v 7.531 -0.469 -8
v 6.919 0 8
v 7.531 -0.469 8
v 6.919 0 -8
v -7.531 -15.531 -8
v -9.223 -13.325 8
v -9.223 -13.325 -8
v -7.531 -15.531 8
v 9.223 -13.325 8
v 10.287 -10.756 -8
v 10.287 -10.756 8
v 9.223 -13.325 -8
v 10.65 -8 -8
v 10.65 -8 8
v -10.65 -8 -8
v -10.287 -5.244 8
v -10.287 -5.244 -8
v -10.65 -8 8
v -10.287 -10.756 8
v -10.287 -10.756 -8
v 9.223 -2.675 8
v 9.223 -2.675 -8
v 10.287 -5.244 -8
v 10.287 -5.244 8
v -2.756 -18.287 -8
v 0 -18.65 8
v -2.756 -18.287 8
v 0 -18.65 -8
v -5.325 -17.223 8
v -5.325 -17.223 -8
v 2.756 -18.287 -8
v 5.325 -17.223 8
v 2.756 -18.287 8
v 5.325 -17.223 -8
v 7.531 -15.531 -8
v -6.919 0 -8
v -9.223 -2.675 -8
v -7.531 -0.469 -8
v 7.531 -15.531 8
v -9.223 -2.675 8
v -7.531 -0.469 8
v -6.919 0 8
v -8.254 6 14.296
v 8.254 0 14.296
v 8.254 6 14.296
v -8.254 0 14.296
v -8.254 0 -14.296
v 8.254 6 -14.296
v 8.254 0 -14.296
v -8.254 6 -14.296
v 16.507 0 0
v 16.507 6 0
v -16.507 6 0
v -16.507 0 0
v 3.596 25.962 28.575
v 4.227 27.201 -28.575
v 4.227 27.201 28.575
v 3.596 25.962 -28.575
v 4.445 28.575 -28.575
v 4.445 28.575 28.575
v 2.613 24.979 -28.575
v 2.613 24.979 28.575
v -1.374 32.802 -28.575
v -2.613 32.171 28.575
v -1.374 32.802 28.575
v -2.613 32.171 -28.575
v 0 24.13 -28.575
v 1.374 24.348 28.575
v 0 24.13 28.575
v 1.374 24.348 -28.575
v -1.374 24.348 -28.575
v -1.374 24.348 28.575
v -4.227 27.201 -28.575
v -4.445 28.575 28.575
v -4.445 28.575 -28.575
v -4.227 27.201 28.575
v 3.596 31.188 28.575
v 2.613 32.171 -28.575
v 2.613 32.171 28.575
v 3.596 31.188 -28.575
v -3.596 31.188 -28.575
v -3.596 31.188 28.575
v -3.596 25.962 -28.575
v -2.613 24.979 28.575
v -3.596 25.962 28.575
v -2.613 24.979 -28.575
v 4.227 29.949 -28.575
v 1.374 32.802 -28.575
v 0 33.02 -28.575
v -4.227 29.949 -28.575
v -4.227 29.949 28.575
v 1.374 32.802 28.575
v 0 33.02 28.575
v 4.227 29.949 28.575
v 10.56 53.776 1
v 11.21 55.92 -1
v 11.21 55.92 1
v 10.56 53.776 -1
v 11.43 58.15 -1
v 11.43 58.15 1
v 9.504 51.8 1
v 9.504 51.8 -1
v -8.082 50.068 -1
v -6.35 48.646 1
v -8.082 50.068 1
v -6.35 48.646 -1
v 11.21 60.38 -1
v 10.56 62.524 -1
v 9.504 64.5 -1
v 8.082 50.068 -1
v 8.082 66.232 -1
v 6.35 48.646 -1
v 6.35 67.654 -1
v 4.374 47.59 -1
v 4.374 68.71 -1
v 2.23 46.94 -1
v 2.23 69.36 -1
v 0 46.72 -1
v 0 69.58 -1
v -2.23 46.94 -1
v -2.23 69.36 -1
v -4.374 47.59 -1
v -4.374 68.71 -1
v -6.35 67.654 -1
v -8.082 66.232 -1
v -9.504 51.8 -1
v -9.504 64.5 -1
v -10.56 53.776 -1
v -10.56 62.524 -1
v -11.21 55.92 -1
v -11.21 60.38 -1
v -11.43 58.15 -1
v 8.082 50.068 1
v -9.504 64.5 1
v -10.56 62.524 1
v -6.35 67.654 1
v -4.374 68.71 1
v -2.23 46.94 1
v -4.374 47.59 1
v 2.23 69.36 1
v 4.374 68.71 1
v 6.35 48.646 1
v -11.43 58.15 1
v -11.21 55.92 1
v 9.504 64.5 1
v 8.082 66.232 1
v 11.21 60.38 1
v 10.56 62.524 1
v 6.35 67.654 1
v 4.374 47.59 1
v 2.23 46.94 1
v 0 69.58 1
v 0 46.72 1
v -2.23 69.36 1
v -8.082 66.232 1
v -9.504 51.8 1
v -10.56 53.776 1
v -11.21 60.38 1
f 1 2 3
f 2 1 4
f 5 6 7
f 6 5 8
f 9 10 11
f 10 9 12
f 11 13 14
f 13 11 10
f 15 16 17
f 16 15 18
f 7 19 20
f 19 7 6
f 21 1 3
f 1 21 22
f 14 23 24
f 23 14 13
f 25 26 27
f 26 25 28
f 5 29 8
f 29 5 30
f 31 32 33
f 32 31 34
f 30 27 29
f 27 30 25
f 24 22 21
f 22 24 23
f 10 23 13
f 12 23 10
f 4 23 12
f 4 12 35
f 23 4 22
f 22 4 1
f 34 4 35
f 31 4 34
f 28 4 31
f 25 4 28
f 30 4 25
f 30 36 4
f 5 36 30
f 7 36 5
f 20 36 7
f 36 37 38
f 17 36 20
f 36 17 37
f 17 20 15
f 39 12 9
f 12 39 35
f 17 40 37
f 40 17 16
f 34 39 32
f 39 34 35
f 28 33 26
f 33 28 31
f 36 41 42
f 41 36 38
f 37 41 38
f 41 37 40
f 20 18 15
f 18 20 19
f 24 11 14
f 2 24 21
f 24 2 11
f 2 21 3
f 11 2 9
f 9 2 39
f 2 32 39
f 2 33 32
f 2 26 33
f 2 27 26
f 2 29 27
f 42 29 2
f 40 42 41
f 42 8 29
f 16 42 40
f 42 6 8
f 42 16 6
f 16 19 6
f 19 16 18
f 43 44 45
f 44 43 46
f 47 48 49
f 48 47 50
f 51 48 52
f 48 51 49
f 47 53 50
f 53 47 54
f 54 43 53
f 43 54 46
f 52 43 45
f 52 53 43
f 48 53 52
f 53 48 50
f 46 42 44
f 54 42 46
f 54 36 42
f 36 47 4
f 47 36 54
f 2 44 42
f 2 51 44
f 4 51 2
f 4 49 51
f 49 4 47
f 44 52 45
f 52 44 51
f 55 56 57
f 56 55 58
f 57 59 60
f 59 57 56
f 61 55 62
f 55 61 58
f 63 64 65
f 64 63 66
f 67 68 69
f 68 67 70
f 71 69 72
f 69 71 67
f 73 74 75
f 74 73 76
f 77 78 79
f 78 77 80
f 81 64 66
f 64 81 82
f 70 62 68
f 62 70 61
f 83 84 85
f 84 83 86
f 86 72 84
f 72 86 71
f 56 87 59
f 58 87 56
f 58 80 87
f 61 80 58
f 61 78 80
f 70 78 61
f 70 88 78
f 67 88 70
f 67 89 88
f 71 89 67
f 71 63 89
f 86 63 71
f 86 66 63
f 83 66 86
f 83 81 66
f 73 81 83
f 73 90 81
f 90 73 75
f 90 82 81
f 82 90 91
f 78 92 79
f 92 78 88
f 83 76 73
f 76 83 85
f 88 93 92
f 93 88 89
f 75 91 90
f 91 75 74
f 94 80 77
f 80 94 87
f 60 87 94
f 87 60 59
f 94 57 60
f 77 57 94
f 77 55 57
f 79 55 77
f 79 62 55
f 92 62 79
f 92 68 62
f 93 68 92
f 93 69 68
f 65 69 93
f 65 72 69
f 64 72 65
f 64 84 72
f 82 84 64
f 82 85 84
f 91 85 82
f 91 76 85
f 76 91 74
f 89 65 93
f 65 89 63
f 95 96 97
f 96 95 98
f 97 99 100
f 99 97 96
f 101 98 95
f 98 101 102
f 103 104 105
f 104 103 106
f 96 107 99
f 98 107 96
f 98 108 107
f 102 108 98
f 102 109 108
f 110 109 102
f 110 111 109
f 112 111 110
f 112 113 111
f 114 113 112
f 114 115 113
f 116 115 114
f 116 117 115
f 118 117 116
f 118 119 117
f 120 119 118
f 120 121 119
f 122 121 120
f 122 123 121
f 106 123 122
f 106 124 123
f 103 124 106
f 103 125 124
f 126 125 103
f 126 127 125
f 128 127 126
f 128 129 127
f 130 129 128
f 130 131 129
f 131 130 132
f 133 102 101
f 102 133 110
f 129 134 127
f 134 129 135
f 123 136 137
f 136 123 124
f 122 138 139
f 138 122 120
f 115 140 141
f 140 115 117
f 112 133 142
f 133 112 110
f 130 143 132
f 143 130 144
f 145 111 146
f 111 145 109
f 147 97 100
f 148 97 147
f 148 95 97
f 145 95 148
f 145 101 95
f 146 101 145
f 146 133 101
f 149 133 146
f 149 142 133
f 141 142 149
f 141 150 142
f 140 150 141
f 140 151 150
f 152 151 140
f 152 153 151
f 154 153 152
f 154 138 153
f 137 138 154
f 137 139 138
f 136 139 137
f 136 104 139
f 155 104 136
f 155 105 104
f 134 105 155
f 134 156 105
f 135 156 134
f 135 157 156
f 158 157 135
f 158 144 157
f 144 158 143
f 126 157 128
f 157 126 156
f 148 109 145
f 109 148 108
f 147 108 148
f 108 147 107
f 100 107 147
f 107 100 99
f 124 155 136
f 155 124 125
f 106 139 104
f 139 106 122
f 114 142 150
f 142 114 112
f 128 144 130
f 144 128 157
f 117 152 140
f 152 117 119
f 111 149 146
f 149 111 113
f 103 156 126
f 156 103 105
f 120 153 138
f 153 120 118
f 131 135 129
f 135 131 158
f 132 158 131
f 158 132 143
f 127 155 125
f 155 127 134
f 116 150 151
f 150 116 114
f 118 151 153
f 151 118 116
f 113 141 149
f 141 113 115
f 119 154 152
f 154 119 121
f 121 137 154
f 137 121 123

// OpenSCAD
// Auto-generated by scripts/author_from_manifest.py (Phase D.3).
// Source: data/phase_d_manifest.json (sku_intent='tyco-ty3151-upright-135f').
// Do not hand-edit — regenerate from the manifest.
//
// @part tyco_ty3151_upright_135f
// @kind sprinkler_head
// @category head.upright.k56
// @display-name "Tyco TY3151 Upright K5.6 SR 135°F"
// @mfg tyco_fire_protection
// @mfg-pn TY3151
// @listing UL FM
// @hazard-classes LH OH1
// @price-usd 13.80
// @install-minutes 8
// @crew journeyman
// @k-factor 5.6
// @orientation upright
// @response standard
// @temperature 135F
// @param size_in number default=0.5 label="Size" unit="in"
// @port inlet position=[0,0.014,0] direction=[0,1,0] style=NPT_threaded size_in=0.5 role=drop

size_in = 0.5;
k_factor = 5.6;

length_mm   = 57.15;
body_dia_mm = 25.40;
thread_od   = 21.3;
thread_len  = 16;
deflector_d = body_dia_mm * 0.9;

rotate([180,0,0]) union() {
    translate([0, thread_len/2, 0])
        cylinder(h = thread_len, d = thread_od, center = true, $fn = 24);
    translate([0, -3, 0])
        rotate([90, 0, 0])
        cylinder(h = 6, d = thread_od * 1.55, $fn = 6, center = true);
    translate([0, -length_mm/2, 0])
        cylinder(h = length_mm, d = body_dia_mm * 0.35, center = true, $fn = 20);
    translate([0, -length_mm - 1, 0])
        cylinder(h = 2, d = deflector_d, center = true, $fn = 32);
}
